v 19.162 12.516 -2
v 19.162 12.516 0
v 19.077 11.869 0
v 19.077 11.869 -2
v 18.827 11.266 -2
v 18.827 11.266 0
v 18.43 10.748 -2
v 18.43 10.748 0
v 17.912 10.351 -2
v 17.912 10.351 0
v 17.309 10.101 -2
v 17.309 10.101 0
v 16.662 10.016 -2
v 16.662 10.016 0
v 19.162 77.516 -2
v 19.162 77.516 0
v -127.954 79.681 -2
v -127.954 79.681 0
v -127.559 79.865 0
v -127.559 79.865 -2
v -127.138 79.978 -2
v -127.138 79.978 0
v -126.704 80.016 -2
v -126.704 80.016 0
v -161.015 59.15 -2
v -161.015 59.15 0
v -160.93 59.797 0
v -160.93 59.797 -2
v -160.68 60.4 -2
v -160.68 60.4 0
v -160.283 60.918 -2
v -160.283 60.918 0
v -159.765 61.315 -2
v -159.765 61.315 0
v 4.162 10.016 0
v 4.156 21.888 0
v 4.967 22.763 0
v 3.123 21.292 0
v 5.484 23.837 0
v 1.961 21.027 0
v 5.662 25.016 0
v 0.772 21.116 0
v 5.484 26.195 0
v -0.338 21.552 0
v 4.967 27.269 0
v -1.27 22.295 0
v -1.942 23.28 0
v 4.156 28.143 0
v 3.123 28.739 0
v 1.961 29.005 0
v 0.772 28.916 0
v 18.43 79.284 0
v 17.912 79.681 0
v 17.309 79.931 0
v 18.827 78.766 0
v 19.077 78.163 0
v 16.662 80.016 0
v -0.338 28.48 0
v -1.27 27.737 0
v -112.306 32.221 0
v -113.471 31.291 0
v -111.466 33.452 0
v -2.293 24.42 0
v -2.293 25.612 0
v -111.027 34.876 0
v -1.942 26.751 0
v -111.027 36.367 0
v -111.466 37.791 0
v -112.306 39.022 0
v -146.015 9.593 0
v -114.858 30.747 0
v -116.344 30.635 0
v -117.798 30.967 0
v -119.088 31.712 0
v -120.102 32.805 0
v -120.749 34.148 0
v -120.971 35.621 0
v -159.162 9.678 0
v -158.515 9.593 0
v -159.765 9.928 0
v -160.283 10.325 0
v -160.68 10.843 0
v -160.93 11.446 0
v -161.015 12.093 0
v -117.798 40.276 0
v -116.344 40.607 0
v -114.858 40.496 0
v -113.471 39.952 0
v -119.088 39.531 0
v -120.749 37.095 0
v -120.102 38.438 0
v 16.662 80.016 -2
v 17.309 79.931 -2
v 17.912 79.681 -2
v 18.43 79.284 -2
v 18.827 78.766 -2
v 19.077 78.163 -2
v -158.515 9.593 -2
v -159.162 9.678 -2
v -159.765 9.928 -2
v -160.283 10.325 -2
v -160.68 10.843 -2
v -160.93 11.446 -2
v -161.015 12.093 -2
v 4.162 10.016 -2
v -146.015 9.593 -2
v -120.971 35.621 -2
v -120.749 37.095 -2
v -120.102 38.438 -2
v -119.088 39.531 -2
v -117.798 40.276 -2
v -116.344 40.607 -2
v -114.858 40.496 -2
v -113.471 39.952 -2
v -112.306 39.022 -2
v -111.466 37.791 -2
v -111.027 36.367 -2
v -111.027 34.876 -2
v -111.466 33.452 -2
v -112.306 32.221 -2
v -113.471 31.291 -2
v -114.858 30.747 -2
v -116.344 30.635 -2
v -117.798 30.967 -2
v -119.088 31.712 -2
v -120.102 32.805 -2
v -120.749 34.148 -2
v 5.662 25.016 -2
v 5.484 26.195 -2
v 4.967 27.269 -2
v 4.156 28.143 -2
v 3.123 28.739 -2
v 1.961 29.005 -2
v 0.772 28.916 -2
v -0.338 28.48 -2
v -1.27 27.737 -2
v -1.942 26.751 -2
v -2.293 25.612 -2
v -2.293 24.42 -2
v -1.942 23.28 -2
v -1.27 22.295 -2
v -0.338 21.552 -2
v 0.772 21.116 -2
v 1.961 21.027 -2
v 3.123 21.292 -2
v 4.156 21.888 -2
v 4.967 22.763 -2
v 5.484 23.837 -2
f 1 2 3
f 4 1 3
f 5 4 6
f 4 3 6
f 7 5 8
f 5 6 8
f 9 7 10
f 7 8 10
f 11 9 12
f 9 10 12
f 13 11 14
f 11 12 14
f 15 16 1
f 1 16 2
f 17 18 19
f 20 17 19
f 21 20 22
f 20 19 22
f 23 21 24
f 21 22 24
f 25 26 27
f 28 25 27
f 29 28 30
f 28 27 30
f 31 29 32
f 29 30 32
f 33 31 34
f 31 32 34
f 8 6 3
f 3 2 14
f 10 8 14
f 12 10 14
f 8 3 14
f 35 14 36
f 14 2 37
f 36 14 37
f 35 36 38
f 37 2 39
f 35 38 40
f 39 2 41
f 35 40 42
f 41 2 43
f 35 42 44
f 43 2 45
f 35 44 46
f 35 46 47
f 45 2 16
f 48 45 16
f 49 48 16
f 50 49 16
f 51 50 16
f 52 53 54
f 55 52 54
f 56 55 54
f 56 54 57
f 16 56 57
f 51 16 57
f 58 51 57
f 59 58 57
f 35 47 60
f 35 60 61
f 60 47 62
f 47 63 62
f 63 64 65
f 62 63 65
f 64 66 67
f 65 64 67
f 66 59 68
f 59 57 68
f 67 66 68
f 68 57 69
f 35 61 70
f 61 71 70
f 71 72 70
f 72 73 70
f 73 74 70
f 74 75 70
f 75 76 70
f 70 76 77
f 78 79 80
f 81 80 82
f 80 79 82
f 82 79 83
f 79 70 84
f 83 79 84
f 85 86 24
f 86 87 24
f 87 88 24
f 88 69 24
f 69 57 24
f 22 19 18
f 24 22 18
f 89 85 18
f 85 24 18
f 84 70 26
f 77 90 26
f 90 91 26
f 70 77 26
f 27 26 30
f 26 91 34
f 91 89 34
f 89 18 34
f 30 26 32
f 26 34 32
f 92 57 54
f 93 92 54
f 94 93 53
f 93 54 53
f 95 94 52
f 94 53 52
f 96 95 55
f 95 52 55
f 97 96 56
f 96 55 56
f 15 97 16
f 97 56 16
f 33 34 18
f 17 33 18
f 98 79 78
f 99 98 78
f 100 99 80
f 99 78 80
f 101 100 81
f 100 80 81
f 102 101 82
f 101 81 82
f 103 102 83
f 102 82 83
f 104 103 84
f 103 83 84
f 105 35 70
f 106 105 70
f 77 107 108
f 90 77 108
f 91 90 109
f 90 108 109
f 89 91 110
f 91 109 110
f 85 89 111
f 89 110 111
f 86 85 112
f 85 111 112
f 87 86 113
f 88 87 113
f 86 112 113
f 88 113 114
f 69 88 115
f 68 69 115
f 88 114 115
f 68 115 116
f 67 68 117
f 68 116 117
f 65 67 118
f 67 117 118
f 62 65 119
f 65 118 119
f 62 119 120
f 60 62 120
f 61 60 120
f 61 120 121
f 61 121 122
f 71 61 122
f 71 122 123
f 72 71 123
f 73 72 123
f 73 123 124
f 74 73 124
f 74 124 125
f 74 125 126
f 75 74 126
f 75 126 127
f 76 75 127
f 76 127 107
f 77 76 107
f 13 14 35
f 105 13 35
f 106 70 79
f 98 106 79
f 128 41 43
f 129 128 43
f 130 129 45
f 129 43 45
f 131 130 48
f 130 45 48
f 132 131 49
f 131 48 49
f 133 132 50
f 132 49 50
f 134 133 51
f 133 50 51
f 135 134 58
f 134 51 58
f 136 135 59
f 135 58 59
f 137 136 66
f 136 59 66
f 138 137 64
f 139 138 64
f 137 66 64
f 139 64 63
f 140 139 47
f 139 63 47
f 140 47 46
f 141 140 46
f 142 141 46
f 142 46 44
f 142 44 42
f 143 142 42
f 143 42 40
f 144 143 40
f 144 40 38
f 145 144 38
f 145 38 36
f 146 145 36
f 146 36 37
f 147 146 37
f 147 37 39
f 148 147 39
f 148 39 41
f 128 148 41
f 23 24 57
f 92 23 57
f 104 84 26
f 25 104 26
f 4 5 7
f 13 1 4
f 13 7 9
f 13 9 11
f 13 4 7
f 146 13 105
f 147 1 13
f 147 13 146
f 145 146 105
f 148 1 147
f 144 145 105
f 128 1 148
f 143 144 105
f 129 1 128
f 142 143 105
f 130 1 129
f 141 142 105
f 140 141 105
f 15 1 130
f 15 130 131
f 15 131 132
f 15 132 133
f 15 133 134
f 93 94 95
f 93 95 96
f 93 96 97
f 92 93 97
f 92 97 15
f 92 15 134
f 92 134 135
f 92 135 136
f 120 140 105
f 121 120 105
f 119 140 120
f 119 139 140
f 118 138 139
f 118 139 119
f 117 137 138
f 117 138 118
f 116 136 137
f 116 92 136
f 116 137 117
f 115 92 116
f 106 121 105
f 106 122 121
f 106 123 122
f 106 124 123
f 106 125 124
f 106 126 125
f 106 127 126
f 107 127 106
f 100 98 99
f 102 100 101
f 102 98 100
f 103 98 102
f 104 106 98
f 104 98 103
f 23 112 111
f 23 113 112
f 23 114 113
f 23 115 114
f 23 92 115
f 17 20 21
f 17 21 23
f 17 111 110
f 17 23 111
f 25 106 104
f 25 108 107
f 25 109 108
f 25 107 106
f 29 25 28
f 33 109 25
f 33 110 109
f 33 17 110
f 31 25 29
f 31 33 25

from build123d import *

# Parameters (mm, degrees)
BASE_FLANGE1_DEPTH = 2
SKETCH2_R          = 5
CUT_EXTRUDE1_DEPTH = 10
SKETCH4_R          = 4
CUT_EXTRUDE3_DEPTH = 10


# Sheet-metal steps are written as plain solids
with BuildPart() as part:
    # Sketch1 → Base-Flange1 (new body)
    with BuildSketch(Plane.XY):
        with BuildLine():
            Line((16.661890932, 10.015815157), (4.161890932, 10.015815157))
            Line((4.161890932, 10.015815157), (-146.015023604, 9.593165426))
            Line((-146.015023604, 9.593165426), (-158.515023604, 9.593165426))
            ThreePointArc((-158.515023604, 9.593165426), (-160.282790557, 10.325398473), (-161.015023604, 12.093165426))
            Line((-161.015023604, 12.093165426), (-161.015023604, 59.149789753))
            ThreePointArc((-161.015023604, 59.149789753), (-160.680087113, 60.399789753), (-159.765023604, 61.314853262))
            Line((-159.765023604, 61.314853262), (-127.954134471, 79.680878666))
            ThreePointArc((-127.954134471, 79.680878666), (-127.351182084, 79.930629722), (-126.704134471, 80.015815157))
            Line((-126.704134471, 80.015815157), (16.661890932, 80.015815157))
            ThreePointArc((16.661890932, 80.015815157), (18.429657885, 79.28358211), (19.161890932, 77.515815157))
            Line((19.161890932, 77.515815157), (19.161890932, 12.515815157))
            ThreePointArc((19.161890932, 12.515815157), (18.429657885, 10.748048204), (16.661890932, 10.015815157))
        make_face()
    extrude(amount=-BASE_FLANGE1_DEPTH)

    # Sketch2 → Cut-Extrude1 (cut)
    with BuildSketch(Plane(origin=(0, 0, -2), x_dir=(-1, 0, 0), z_dir=(0, 0, -1))):
        with Locations((115.97079497, 35.621477589)):
            Circle(SKETCH2_R)
    extrude(amount=-CUT_EXTRUDE1_DEPTH, mode=Mode.SUBTRACT)

    # Sketch4 → Cut-Extrude3 (cut)
    with BuildSketch(Plane.XY):
        with Locations((1.661890932, 25.015815157)):
            Circle(SKETCH4_R)
    extrude(amount=-CUT_EXTRUDE3_DEPTH, mode=Mode.SUBTRACT)


solid = part.part
